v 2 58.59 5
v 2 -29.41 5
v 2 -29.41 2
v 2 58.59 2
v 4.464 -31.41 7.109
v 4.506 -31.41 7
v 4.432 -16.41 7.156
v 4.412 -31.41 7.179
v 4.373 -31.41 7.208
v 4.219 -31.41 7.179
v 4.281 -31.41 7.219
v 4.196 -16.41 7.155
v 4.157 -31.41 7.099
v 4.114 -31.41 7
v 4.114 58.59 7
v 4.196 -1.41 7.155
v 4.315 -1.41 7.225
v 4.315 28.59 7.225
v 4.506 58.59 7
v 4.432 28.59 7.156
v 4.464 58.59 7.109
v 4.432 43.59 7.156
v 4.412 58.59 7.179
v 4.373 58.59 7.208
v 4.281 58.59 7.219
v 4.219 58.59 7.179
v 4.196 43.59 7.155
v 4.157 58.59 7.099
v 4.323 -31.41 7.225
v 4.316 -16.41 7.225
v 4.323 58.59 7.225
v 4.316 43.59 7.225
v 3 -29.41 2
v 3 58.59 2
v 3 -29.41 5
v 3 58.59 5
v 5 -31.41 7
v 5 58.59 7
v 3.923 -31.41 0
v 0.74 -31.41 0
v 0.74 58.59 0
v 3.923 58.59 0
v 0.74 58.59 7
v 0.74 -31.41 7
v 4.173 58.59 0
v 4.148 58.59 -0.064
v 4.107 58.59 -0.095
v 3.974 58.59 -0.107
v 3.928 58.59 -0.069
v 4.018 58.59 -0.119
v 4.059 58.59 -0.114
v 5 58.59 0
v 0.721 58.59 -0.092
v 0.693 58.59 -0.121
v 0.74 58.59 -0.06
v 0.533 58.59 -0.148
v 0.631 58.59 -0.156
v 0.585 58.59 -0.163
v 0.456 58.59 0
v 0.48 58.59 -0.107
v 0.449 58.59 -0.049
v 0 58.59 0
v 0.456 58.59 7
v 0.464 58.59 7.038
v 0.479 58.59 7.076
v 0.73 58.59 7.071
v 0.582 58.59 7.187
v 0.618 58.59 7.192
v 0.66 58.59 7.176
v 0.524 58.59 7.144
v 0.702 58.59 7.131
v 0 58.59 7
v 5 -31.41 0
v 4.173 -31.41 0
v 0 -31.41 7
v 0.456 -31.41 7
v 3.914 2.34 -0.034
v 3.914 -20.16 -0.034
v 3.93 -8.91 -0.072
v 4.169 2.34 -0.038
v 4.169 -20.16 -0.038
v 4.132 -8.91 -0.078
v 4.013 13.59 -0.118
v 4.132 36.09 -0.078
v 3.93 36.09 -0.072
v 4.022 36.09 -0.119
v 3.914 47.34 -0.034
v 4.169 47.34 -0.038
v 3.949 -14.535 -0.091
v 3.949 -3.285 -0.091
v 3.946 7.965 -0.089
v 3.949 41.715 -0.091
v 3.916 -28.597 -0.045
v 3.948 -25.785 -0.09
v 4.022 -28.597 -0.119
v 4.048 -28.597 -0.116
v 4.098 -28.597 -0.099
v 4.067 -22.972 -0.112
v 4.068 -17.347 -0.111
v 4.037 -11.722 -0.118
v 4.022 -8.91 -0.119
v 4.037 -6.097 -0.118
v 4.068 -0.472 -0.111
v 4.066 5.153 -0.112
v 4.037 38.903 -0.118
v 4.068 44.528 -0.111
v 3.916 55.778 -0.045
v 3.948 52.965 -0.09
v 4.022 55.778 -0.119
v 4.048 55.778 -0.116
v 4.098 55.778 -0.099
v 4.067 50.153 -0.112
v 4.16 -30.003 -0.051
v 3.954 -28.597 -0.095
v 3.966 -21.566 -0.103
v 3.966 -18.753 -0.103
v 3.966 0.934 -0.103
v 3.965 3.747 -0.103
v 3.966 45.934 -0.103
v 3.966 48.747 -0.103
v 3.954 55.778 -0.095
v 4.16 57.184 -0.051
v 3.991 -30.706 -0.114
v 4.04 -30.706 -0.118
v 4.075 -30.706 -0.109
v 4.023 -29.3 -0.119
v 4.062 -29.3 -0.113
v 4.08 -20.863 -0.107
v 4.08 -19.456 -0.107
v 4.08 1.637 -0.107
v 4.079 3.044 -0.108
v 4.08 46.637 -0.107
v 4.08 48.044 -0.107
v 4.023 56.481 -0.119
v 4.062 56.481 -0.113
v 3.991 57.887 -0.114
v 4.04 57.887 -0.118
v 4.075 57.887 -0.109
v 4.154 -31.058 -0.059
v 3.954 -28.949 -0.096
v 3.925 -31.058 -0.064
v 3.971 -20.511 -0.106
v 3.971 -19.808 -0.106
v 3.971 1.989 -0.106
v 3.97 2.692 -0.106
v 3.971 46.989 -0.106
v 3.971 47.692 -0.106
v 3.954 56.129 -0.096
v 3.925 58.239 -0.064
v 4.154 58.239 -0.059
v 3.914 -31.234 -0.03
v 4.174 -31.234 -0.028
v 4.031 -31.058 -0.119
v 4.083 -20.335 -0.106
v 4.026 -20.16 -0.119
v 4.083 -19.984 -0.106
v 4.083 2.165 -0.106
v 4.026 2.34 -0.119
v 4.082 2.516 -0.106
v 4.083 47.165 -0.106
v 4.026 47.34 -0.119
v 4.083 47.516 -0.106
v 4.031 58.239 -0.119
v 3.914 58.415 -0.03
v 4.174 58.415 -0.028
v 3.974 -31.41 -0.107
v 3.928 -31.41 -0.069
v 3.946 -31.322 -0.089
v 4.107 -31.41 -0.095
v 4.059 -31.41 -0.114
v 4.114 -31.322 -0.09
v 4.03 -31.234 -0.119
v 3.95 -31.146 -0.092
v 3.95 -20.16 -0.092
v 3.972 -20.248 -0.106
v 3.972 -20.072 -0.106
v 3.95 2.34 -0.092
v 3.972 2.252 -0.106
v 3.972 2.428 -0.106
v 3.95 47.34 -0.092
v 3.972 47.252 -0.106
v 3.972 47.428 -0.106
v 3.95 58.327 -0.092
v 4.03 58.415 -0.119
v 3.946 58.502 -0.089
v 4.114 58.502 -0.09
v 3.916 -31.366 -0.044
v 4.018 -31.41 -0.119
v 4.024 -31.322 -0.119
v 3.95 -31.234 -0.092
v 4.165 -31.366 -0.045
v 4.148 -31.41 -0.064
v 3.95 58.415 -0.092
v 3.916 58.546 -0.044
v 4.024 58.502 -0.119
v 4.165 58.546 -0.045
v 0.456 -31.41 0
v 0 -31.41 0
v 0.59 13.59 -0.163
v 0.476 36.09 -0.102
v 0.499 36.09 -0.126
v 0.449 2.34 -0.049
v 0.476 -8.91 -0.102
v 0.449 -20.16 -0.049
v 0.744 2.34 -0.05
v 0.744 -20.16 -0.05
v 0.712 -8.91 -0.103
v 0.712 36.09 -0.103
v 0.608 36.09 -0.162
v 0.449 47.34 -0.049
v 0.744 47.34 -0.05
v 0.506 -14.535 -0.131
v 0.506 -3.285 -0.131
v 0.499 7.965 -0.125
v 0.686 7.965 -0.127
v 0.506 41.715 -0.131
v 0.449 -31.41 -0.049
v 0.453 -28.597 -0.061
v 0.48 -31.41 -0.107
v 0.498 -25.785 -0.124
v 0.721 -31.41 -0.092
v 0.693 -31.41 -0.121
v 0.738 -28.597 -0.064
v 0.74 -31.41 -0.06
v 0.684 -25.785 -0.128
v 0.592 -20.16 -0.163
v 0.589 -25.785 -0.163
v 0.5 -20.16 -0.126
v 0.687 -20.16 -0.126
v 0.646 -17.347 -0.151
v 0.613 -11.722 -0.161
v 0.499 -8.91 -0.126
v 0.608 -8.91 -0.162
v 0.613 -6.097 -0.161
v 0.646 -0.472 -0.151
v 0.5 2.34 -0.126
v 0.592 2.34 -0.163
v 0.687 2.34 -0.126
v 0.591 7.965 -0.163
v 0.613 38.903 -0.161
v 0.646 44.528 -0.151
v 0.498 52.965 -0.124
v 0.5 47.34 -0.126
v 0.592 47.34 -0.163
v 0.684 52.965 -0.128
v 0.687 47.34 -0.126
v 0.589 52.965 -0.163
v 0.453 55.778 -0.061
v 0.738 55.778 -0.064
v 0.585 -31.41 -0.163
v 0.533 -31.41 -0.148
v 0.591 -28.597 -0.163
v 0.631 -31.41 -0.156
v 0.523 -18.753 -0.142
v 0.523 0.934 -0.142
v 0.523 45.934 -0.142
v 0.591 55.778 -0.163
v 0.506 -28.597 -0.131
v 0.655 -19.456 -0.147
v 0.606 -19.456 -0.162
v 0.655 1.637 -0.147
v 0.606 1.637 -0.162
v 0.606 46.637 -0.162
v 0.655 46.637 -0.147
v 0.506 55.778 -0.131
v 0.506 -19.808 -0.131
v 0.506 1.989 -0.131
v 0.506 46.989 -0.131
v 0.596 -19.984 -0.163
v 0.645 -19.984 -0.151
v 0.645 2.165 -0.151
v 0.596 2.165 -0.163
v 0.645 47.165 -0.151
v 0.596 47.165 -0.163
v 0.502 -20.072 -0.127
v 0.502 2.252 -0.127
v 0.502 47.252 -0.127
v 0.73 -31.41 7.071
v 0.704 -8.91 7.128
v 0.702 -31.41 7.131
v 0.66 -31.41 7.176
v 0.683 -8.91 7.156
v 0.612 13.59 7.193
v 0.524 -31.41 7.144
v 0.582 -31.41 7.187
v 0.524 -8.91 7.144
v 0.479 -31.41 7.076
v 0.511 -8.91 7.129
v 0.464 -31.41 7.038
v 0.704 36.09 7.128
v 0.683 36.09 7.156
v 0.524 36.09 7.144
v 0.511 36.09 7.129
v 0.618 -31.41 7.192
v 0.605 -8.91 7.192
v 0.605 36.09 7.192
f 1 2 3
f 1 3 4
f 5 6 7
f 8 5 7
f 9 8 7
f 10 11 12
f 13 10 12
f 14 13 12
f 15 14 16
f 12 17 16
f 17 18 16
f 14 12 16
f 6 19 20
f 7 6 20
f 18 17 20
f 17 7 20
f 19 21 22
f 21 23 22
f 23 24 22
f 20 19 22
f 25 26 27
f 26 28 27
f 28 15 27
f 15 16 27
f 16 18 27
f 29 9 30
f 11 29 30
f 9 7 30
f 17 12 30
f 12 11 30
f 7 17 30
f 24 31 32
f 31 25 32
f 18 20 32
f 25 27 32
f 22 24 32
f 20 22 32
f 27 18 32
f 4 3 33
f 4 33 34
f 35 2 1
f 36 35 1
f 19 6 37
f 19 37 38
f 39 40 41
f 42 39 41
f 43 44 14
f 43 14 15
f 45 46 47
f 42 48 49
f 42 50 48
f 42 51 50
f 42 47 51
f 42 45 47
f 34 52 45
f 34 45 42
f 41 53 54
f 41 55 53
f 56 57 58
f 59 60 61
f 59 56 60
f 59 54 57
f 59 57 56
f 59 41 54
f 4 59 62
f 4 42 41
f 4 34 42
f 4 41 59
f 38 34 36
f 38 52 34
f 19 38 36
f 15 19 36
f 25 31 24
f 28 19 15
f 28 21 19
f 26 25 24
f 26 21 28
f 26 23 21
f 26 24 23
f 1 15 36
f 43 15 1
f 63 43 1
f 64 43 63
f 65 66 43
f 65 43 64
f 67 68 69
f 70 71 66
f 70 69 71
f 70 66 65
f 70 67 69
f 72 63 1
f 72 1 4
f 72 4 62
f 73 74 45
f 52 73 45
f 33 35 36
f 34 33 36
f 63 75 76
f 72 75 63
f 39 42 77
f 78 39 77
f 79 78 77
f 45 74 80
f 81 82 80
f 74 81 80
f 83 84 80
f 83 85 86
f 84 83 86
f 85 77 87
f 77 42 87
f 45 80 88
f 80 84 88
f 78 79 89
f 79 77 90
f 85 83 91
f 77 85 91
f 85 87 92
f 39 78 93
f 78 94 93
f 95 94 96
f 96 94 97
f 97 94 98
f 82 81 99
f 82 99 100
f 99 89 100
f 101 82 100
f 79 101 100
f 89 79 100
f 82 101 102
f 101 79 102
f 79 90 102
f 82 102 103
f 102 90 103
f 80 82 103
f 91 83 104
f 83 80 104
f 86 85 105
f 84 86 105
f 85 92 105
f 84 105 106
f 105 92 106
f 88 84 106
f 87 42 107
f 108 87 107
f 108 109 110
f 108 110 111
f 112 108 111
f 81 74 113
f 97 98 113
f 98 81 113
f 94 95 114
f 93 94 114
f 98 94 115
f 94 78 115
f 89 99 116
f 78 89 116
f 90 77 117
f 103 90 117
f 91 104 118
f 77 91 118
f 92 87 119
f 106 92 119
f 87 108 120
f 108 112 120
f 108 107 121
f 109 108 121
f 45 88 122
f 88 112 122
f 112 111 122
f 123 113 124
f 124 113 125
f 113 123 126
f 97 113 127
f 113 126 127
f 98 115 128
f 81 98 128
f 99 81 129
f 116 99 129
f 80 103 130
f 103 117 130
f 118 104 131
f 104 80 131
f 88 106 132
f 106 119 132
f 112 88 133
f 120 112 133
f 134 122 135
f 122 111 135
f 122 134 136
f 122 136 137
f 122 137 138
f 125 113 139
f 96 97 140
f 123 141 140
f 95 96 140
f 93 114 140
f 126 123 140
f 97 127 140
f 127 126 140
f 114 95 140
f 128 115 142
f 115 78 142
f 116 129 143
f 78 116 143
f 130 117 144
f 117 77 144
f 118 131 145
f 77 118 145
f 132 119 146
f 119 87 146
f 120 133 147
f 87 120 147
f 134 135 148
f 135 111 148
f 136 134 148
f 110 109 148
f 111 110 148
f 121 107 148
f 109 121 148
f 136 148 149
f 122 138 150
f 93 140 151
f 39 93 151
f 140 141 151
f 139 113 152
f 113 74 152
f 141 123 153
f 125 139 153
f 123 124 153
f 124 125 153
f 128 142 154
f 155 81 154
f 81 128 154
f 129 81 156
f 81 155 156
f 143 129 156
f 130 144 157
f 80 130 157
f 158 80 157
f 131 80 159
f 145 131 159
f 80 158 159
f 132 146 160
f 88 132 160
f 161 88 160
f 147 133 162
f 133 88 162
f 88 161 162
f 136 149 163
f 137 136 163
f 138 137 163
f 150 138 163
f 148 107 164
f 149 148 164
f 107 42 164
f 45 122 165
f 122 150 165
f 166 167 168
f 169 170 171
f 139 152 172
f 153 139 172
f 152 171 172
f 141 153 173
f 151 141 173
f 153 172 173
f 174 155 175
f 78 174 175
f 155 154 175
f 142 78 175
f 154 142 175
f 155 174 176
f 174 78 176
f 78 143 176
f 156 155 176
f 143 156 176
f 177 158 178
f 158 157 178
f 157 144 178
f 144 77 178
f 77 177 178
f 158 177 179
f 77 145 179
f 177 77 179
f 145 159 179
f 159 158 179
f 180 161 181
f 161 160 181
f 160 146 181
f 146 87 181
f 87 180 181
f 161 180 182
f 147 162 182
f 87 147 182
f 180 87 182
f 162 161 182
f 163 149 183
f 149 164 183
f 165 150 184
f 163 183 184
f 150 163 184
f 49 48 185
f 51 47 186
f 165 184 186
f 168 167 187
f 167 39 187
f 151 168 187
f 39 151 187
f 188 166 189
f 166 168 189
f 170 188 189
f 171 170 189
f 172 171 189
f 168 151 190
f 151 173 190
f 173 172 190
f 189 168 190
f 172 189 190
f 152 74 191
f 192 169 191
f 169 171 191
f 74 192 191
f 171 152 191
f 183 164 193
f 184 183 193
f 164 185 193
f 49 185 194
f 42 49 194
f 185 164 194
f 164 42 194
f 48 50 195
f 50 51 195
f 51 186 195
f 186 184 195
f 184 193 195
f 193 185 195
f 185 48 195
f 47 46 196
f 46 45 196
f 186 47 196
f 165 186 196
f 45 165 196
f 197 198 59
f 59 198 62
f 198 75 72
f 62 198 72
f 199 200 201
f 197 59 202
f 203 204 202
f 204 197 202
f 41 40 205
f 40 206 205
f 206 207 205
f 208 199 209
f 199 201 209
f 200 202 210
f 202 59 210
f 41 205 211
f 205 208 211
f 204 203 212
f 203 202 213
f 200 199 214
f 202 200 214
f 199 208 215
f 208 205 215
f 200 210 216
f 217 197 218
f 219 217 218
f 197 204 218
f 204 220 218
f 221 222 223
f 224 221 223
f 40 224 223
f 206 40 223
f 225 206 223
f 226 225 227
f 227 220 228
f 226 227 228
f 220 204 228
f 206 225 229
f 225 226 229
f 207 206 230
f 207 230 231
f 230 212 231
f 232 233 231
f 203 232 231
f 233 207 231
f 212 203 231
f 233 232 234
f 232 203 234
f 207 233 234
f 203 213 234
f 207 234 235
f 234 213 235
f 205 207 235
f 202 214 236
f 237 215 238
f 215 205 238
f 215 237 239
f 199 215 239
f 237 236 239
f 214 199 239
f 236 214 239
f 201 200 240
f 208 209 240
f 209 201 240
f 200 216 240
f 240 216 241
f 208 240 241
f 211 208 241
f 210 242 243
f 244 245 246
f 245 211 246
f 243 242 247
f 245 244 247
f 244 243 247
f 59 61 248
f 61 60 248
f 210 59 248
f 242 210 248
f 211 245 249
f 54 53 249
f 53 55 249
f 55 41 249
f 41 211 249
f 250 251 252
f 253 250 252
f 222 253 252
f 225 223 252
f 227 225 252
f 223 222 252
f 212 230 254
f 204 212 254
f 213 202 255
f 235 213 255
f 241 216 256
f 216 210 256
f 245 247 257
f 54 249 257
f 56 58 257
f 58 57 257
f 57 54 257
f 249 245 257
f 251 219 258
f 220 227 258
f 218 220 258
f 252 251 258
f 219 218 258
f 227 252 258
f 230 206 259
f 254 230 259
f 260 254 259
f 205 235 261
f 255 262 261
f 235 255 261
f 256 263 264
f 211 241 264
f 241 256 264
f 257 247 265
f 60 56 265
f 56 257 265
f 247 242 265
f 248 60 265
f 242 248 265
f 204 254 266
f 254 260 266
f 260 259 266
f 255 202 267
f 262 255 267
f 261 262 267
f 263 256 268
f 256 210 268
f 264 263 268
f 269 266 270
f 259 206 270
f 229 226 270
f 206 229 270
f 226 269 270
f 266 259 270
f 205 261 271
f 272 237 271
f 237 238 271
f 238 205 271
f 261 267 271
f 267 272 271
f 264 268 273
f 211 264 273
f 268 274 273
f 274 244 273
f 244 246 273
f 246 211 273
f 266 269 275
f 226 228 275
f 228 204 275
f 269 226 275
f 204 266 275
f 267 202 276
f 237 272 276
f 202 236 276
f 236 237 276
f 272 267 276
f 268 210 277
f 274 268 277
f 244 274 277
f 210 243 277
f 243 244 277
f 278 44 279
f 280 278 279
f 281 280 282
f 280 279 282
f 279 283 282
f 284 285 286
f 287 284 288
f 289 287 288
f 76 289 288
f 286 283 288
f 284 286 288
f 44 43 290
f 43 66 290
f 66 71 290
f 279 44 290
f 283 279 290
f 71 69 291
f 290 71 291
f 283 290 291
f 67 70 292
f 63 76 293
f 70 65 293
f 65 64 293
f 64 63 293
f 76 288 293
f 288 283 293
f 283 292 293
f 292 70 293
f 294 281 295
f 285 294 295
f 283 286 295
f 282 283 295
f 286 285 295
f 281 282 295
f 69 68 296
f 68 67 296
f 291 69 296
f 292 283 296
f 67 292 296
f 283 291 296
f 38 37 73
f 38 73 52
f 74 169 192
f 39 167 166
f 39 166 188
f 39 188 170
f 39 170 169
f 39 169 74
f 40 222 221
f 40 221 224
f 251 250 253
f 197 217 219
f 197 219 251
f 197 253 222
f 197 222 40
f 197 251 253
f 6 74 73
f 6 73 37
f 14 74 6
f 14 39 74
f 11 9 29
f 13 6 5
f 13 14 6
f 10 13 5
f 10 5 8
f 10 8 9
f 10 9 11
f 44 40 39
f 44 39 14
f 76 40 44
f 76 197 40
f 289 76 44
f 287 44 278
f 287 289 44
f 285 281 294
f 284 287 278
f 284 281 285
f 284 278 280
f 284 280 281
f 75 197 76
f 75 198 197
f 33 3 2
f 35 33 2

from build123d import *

# Parameters (mm, degrees)
F0_W     = 90
F0_H     = 7
F1_DEPTH = 5
F2_T     = -2
F4_DEPTH = 90
F6_DEPTH = 90
F9_DEPTH = 90


with BuildPart() as f1:
    # F0 (on Right) → F1 (new body)
    with BuildSketch(Plane.YZ):
        with Locations((13.5903862119, 3.5)):
            Rectangle(F0_W, F0_H)
    extrude(amount=F1_DEPTH)

    # F2
    f2_openings = [f1.faces().sort_by_distance(p)[0] for p in [
        (2.5, 58.590386, 3.5),
    ]]
    offset(amount=F2_T, openings=f2_openings)

    # F3 (on face) → F4 (join)
    with BuildSketch(Plane(origin=(0, 58.5903862119, 0), x_dir=(-1, 0, 0), z_dir=(0, 1, 0))):
        with BuildLine():
            add(Edge.make_bspline(
                [(-4.4927471317, 6.8335854448), (-4.5660253813, 6.9655119185), (-4.3165354389, 7.4956076145), (-3.9218503585, 6.688839741), (-4.4243988792, 6.7105346898), (-4.4927471317, 6.8335854448)],
                knots=[0, 0, 0, 0, 0.3378548186, 0.6848752994, 1, 1, 1, 1], degree=3))
        make_face()
    extrude(amount=-F4_DEPTH)

    # F5 (on face) → F6 (join)
    with BuildSketch(Plane(origin=(0, 58.5903862119, 0), x_dir=(-1, 0, 0), z_dir=(0, 1, 0))):
        with BuildLine():
            add(Edge.make_bspline(
                [(-0.7403470987, 7), (-0.744928401, 7.0852952576), (-0.61828683, 7.299312345), (-0.4655472616, 7.0863177766), (-0.4555928001, 7)],
                knots=[0.063573249, 0.063573249, 0.063573249, 0.063573249, 0.330947852, 0.5992996658, 0.5992996658, 0.5992996658, 0.5992996658], degree=3))
            Line((-0.7403470987, 7), (-0.4555928001, 7))
        make_face()
    extrude(amount=-F6_DEPTH)

    # F7 (on face) + F8 (on face) → F9 (join)
    with BuildSketch(Plane(origin=(0, 58.5903862119, 0), x_dir=(-1, 0, 0), z_dir=(0, 1, 0))):
        with BuildLine():
            Line((-0.7403470979, 0), (-0.4555928001, 0))
            add(Edge.make_bspline(
                [(-0.7403470979, 0), (-0.7018064847, 0.0647744469), (-0.4979936325, 0.0653103199), (-0.4555928001, 0)],
                knots=[0.6354416672, 0.6354416672, 0.6354416672, 0.6354416672, 1, 1, 1, 1], degree=3))
        make_face()
        with BuildLine():
            add(Edge.make_bspline(
                [(-0.4555928001, 0), (-0.4190961932, -0.0562159972), (-0.587360905, -0.2688458523), (-0.7743512153, -0.0571500481), (-0.7403470979, 0)],
                knots=[0, 0, 0, 0, 0.3137943625, 0.6354416672, 0.6354416672, 0.6354416672, 0.6354416672], degree=3))
            Line((-0.4555928001, 0), (-0.7403470979, 0))
        make_face()
    with BuildSketch(Plane(origin=(0, 58.5903862119, 0), x_dir=(-1, 0, 0), z_dir=(0, 1, 0))):
        with BuildLine():
            add(Edge.make_bspline(
                [(-3.9229183458, 0), (-3.8911392187, -0.0399748921), (-4.0049623328, -0.195717275), (-4.1958645114, -0.0440099941), (-4.1729910299, 0)],
                knots=[0, 0, 0, 0, 0.2897821962, 0.6244929237, 0.6244929237, 0.6244929237, 0.6244929237], degree=3))
            Line((-3.9229183458, 0), (-4.1729910299, 0))
        make_face()
    extrude(amount=-F9_DEPTH)


solid = f1.part
